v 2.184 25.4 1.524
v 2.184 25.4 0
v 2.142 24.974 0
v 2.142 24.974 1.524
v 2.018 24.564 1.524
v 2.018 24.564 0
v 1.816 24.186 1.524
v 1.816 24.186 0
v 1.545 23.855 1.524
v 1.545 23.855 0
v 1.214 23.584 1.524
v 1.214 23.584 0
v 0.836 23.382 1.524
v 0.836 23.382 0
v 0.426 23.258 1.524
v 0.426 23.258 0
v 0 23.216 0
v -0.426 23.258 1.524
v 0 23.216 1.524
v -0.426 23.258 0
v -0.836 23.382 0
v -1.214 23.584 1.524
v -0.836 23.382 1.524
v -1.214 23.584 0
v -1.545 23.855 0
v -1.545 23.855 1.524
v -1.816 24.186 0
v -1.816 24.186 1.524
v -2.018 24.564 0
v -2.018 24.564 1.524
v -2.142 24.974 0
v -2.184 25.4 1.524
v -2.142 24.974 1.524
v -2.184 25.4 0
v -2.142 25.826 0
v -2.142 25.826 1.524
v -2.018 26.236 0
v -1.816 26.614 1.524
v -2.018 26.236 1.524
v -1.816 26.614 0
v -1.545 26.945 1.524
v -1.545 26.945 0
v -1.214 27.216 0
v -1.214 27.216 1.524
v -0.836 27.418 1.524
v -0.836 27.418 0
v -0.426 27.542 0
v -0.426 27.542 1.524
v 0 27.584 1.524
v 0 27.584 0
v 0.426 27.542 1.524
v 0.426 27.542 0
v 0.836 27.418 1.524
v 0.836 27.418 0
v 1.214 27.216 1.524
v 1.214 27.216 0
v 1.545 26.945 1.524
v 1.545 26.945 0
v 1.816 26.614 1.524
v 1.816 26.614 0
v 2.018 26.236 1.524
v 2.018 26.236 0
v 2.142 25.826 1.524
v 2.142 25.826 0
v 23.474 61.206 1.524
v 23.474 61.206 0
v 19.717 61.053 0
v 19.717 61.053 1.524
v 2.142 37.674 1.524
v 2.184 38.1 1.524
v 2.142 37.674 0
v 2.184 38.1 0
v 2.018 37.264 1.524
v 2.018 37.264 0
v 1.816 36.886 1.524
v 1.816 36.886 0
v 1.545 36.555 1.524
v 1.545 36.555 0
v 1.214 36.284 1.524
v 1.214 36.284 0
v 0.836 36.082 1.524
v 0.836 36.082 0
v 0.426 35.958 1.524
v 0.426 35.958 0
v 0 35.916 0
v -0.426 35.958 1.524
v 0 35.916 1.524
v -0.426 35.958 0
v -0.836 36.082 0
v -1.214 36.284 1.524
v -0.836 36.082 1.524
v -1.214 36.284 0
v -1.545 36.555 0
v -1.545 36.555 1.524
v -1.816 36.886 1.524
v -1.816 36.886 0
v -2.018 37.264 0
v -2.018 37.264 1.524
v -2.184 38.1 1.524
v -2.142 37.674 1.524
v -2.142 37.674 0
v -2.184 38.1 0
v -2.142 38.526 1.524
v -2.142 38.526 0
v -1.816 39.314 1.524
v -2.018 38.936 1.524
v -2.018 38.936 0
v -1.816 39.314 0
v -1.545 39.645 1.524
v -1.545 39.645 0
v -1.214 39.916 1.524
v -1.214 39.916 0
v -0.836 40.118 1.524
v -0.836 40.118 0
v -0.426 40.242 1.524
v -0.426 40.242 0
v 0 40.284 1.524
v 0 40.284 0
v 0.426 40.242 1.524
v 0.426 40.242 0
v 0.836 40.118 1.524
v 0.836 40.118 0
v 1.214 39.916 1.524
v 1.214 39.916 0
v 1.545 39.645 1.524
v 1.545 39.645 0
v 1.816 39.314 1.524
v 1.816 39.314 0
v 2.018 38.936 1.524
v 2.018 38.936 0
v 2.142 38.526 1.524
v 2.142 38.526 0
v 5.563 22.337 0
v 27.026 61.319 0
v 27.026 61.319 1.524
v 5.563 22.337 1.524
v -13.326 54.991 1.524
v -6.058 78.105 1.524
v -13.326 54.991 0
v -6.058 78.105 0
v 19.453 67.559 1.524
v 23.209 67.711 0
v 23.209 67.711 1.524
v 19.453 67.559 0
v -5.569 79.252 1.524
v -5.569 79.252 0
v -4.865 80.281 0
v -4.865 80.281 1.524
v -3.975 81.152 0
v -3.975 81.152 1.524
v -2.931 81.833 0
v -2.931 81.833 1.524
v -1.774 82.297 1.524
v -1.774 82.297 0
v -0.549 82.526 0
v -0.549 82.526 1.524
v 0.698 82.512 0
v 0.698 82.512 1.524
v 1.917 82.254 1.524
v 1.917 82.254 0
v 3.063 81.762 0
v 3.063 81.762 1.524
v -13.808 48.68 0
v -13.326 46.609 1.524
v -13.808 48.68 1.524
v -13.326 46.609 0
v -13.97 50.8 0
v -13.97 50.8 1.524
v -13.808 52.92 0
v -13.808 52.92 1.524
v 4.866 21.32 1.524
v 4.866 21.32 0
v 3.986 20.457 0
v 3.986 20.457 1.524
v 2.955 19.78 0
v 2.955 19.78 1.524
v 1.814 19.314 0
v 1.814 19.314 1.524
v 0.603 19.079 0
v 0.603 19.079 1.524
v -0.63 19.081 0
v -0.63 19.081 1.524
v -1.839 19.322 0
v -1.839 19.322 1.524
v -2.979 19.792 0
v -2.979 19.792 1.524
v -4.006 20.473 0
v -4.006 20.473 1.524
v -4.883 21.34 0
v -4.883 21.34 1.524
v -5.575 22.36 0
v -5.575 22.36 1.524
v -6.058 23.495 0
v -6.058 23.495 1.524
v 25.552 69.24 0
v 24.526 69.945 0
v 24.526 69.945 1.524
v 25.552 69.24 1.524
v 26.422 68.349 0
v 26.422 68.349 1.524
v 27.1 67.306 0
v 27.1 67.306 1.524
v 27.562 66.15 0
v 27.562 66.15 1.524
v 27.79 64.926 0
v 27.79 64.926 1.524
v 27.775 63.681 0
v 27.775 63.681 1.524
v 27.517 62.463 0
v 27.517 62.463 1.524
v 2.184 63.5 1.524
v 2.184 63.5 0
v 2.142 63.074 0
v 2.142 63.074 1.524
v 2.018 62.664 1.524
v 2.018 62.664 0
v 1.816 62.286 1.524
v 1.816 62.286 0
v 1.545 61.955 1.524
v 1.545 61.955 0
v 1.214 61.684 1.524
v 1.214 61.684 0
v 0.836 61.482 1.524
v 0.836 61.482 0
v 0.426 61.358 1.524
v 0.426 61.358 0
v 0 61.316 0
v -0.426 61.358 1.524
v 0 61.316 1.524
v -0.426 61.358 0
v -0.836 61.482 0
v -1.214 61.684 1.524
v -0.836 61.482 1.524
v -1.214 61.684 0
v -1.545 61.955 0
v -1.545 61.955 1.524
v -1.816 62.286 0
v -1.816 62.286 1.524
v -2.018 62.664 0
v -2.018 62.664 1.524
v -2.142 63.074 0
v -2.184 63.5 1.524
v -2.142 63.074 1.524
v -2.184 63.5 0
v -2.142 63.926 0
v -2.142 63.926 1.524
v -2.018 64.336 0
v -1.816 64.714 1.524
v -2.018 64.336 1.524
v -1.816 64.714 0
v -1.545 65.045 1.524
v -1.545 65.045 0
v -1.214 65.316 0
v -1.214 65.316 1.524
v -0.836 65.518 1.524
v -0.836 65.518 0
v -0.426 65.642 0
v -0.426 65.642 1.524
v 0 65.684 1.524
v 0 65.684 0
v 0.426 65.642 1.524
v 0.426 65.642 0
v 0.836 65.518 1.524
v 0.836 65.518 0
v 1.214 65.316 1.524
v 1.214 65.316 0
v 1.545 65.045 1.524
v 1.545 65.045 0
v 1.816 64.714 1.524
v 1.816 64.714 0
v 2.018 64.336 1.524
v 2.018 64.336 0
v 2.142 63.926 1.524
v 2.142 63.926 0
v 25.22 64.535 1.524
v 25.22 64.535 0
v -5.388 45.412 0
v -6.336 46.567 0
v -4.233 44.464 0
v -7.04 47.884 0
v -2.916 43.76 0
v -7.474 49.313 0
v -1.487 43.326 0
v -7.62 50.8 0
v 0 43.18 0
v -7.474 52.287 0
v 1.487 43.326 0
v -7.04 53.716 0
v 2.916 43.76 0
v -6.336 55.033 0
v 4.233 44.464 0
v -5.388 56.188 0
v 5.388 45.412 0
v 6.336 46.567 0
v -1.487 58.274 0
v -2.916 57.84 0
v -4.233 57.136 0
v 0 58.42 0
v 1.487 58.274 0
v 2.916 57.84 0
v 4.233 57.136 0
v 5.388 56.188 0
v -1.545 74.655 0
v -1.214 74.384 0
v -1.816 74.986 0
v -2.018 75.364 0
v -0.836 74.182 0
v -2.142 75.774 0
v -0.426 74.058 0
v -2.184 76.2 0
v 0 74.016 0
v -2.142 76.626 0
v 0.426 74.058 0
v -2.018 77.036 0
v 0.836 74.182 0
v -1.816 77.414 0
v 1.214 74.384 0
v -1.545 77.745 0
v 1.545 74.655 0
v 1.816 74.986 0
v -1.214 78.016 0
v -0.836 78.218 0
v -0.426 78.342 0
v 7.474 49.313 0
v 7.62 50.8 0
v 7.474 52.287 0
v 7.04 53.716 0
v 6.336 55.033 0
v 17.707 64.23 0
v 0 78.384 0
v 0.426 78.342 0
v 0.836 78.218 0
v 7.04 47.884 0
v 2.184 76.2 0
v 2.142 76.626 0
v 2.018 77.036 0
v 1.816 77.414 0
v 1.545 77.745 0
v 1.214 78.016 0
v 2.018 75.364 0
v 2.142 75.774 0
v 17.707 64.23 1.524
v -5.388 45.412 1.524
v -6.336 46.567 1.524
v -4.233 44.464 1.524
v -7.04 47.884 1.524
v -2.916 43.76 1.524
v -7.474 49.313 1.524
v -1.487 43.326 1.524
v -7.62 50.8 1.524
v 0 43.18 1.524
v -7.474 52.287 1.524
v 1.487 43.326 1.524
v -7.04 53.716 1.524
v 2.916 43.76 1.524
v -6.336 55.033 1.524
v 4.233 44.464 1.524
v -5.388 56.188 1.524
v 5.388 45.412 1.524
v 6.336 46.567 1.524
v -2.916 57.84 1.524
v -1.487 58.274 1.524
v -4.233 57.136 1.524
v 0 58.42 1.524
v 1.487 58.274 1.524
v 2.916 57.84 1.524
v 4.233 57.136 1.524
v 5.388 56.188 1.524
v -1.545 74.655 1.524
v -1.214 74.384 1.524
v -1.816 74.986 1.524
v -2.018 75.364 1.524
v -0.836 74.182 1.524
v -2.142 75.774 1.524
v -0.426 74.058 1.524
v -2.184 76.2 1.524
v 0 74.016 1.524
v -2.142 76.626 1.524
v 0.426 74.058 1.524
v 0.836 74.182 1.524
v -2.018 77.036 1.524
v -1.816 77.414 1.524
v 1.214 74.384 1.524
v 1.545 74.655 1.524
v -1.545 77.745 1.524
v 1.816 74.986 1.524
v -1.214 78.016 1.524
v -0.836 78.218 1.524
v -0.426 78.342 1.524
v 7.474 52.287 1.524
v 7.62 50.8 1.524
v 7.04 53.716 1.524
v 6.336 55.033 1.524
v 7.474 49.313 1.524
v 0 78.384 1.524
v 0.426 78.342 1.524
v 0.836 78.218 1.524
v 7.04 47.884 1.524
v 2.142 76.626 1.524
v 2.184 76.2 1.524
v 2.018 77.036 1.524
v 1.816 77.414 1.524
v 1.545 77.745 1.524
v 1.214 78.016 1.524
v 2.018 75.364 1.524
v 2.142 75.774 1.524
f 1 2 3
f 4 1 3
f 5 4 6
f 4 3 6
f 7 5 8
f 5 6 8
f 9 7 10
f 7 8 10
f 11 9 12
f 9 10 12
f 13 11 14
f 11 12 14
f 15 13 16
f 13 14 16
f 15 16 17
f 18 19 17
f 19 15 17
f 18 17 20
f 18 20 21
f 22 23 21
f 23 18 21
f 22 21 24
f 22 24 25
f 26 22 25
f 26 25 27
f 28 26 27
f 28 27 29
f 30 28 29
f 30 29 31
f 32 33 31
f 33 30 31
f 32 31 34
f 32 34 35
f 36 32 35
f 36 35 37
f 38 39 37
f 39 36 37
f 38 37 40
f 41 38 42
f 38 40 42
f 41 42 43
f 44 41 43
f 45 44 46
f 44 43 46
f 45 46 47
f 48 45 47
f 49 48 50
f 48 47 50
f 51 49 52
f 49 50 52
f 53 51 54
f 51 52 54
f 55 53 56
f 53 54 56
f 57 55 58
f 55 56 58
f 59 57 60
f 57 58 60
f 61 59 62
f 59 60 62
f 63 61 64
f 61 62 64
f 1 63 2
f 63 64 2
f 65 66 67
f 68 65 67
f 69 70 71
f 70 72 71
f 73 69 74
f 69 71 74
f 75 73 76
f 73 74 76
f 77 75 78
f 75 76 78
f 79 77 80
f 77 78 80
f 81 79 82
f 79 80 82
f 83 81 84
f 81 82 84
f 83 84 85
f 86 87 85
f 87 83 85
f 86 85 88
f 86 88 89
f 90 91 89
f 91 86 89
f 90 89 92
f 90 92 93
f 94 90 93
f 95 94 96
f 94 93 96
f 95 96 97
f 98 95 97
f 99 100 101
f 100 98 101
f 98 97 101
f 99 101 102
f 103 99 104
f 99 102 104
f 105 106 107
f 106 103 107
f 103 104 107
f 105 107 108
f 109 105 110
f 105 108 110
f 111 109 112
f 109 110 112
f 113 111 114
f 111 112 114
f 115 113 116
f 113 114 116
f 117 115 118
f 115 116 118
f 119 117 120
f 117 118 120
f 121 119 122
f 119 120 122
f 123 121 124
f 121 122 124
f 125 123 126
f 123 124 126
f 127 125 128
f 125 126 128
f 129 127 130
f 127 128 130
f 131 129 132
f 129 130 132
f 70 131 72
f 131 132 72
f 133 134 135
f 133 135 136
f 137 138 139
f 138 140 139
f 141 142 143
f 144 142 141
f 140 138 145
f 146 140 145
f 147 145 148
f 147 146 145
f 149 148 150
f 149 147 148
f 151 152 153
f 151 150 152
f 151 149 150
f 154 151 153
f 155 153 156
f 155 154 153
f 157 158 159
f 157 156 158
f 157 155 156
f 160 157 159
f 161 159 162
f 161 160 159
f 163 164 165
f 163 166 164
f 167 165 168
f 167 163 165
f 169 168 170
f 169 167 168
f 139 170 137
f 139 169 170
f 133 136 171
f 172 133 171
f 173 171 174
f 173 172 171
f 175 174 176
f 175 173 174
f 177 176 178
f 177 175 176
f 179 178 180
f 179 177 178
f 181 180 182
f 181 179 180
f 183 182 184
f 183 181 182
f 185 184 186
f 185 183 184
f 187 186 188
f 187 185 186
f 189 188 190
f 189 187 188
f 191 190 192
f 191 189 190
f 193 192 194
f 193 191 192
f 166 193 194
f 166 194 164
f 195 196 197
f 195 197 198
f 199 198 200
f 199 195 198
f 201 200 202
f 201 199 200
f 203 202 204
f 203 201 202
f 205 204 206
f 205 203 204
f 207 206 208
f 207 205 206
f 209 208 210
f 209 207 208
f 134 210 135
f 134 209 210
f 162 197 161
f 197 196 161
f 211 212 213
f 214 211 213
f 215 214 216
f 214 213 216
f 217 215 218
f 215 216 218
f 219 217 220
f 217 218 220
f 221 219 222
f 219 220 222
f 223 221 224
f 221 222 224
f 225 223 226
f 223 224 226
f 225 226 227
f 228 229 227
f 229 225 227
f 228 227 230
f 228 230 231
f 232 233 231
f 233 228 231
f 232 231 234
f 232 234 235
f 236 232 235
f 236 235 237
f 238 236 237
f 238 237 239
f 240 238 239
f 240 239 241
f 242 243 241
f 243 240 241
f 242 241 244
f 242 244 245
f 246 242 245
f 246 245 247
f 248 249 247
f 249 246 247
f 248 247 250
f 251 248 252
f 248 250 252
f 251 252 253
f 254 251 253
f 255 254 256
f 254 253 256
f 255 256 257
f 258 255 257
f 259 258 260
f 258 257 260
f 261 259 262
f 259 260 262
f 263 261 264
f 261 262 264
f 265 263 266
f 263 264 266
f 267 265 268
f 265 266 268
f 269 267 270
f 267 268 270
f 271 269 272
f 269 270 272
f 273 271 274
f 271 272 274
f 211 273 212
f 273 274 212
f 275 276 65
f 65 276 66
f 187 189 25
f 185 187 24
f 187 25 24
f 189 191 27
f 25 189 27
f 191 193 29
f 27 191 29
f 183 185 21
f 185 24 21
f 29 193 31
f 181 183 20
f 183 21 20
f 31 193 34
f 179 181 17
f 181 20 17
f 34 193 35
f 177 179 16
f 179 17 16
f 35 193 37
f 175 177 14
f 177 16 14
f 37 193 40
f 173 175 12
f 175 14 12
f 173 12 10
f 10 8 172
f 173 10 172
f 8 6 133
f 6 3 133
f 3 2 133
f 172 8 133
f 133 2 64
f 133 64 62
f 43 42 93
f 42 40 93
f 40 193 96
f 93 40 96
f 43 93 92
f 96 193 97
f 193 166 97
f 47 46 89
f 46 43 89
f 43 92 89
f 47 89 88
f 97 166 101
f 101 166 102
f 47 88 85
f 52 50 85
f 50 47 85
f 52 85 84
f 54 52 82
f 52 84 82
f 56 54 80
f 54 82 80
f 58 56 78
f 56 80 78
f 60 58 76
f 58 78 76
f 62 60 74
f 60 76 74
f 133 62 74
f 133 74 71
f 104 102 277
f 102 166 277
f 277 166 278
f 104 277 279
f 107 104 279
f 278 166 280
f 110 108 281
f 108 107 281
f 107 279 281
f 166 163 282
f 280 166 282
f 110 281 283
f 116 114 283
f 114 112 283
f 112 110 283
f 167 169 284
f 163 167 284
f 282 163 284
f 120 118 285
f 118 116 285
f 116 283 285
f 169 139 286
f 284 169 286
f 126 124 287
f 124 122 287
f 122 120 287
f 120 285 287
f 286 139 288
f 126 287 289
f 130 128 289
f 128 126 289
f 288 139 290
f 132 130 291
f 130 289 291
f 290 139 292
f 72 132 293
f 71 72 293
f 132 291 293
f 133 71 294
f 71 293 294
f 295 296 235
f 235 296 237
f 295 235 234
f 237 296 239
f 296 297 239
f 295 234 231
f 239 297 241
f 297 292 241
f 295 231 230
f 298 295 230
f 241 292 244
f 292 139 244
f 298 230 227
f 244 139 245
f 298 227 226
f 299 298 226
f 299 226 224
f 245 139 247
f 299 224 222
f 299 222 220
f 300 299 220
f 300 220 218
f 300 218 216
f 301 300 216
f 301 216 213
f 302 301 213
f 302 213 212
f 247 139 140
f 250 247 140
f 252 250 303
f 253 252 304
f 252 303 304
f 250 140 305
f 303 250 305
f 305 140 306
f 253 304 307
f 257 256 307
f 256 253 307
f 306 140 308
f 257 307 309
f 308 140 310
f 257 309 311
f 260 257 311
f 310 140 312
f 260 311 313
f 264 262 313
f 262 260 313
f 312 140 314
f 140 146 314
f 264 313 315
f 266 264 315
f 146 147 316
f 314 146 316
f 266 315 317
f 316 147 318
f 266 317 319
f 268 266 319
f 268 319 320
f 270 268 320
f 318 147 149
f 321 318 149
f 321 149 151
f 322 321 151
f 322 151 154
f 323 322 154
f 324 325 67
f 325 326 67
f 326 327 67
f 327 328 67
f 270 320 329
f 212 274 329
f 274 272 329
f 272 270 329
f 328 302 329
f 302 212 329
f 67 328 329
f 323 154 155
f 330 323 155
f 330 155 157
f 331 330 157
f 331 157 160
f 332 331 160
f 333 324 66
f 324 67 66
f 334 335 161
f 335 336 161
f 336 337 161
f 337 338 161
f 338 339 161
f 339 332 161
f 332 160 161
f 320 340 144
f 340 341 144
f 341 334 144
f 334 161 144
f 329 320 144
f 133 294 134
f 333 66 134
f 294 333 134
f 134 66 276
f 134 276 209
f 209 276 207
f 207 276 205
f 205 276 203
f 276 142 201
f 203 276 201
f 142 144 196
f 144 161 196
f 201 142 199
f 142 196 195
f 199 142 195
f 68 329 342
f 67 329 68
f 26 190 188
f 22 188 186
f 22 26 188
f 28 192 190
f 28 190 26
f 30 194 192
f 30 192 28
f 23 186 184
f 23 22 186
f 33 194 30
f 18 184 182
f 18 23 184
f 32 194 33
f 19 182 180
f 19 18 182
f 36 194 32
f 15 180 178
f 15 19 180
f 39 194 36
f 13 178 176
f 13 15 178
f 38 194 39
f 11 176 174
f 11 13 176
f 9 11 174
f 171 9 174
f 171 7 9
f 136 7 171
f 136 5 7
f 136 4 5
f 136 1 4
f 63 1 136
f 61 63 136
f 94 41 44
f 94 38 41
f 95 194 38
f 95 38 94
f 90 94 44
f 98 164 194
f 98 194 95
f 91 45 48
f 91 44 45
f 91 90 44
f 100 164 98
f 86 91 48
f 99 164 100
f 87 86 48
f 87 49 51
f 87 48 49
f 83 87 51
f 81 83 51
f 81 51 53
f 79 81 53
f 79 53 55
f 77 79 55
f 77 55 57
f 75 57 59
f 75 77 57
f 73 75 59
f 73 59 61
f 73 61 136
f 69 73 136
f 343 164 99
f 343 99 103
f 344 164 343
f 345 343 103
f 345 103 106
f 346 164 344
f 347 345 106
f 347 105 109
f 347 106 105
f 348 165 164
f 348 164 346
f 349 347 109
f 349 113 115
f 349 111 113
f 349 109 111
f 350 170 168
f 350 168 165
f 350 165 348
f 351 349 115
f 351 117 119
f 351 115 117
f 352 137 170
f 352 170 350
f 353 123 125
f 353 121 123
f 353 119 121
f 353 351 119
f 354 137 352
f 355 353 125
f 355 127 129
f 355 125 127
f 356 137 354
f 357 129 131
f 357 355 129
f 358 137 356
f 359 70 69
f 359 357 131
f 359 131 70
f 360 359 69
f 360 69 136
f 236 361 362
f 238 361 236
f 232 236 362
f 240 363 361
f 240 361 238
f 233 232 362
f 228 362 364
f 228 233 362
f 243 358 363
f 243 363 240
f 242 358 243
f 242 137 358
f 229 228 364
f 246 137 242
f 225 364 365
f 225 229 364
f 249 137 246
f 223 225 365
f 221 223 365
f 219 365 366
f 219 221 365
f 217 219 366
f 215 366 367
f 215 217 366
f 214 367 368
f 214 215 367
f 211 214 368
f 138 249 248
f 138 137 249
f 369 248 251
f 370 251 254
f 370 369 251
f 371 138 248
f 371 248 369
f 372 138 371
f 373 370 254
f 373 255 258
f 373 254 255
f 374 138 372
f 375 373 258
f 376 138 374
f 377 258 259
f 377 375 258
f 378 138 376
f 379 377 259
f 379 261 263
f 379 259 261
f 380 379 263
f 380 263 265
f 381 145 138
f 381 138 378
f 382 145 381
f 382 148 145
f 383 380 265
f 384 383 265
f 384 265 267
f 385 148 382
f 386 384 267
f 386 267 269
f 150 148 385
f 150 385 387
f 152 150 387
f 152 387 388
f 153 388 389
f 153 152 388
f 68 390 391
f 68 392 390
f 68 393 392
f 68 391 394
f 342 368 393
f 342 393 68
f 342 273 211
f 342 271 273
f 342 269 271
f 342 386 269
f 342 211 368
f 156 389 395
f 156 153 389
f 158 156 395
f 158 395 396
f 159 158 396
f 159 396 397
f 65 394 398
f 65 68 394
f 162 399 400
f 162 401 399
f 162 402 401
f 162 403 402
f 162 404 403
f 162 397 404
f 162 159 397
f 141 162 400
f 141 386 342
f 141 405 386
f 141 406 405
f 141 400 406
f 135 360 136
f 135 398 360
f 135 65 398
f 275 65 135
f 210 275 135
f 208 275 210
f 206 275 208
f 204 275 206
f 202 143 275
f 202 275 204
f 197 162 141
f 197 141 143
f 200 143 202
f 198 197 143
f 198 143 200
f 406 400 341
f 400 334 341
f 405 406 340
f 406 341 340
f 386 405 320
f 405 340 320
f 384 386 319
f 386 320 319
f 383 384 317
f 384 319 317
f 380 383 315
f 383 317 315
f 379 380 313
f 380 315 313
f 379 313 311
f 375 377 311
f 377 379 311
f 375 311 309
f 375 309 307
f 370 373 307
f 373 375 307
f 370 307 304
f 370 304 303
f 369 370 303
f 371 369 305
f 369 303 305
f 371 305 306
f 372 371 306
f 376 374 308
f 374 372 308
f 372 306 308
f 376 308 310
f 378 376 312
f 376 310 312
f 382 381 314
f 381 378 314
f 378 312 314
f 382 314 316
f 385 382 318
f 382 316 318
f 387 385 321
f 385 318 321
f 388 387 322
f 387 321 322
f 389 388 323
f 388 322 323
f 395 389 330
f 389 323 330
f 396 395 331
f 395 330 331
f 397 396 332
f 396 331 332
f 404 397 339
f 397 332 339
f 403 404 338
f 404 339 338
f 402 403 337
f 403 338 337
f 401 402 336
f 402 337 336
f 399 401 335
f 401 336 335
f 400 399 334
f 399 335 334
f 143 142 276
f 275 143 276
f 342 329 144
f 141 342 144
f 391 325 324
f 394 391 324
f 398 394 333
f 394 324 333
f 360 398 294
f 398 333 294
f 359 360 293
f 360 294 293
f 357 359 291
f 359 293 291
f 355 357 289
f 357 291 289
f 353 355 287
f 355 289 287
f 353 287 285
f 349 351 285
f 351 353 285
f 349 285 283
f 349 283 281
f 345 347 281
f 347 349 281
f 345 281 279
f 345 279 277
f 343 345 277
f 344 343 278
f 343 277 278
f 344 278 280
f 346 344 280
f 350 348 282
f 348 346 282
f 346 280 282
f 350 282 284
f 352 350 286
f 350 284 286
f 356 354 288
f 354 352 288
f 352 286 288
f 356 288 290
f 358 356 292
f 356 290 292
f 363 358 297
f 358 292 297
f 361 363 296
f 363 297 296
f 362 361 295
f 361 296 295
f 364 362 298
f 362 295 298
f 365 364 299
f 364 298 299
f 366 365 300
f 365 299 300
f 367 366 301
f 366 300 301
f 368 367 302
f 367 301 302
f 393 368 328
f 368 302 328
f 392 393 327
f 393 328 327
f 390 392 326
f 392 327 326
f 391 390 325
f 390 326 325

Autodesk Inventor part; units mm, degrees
ref_plane "YZ Plane" through (0, 0, 0) normal (1, 0, 0) x (0, 1, 0)
ref_plane "XZ Plane" through (0, 0, 0) normal (0, 1, 0) x (-1, 0, 0)
ref_plane "XY Plane" through (0, 0, 0) normal (0, 0, 1) x (1, 0, 0)
sketch "Sketch1" plane through (0, 0, 0) normal (0, 0, 1) x (1, 0, 0)
  circle A0 centre (0, 38.1) radius 2.1844 projected
  circle A1 centre (0, 25.4) radius 2.1844 projected
  circle A2 centre (0, 76.2) radius 2.1844 projected
  circle A3 centre (0, 63.5) radius 2.1844 projected
  line L0 (23.4735, 61.2055) -> (19.7174, 61.053)
  line L1 (17.7073, 64.2296) -> (19.7174, 61.053)
  line L2 (17.7073, 64.2296) -> (19.4532, 67.5588)
  line L3 (23.2093, 67.7113) -> (19.4532, 67.5588)
  line L4 (23.2093, 67.7113) -> (25.2195, 64.5347)
  line L5 (25.2195, 64.5347) -> (23.4735, 61.2055)
  circle A4 centre (0, 50.8) radius 7.62
  line L6 (27.0259, 61.3194) -> (5.5626, 22.3373)
  line L7 (24.5261, 69.9447) -> (3.0628, 81.7625)
  line L8 (-6.0575, 78.105) -> (-13.3265, 54.991)
  line L9 (-6.0575, 23.495) -> (-13.3265, 46.609)
  arc A5 (-6.0575, 23.495) -> (5.5626, 22.3373) centre (0, 25.4) ccw
  arc A6 (3.0628, 81.7625) -> (-6.0575, 78.105) centre (0, 76.2) ccw
  arc A7 (27.0259, 61.3194) -> (24.5261, 69.9447) centre (21.4634, 64.3821) ccw
  arc A8 (-13.3265, 54.991) -> (-13.3265, 46.609) centre (0, 50.8) ccw
  point P0 (0, 0)
  point P1 (23.4238, 61.2841)
  point P2 (10.7317, 70.2911)
  dimension "d10" = 15.24
extrude "Extrusion1" add sketch "Sketch1" along normal blind 1.524
properties part number "pto-linear-guide"
